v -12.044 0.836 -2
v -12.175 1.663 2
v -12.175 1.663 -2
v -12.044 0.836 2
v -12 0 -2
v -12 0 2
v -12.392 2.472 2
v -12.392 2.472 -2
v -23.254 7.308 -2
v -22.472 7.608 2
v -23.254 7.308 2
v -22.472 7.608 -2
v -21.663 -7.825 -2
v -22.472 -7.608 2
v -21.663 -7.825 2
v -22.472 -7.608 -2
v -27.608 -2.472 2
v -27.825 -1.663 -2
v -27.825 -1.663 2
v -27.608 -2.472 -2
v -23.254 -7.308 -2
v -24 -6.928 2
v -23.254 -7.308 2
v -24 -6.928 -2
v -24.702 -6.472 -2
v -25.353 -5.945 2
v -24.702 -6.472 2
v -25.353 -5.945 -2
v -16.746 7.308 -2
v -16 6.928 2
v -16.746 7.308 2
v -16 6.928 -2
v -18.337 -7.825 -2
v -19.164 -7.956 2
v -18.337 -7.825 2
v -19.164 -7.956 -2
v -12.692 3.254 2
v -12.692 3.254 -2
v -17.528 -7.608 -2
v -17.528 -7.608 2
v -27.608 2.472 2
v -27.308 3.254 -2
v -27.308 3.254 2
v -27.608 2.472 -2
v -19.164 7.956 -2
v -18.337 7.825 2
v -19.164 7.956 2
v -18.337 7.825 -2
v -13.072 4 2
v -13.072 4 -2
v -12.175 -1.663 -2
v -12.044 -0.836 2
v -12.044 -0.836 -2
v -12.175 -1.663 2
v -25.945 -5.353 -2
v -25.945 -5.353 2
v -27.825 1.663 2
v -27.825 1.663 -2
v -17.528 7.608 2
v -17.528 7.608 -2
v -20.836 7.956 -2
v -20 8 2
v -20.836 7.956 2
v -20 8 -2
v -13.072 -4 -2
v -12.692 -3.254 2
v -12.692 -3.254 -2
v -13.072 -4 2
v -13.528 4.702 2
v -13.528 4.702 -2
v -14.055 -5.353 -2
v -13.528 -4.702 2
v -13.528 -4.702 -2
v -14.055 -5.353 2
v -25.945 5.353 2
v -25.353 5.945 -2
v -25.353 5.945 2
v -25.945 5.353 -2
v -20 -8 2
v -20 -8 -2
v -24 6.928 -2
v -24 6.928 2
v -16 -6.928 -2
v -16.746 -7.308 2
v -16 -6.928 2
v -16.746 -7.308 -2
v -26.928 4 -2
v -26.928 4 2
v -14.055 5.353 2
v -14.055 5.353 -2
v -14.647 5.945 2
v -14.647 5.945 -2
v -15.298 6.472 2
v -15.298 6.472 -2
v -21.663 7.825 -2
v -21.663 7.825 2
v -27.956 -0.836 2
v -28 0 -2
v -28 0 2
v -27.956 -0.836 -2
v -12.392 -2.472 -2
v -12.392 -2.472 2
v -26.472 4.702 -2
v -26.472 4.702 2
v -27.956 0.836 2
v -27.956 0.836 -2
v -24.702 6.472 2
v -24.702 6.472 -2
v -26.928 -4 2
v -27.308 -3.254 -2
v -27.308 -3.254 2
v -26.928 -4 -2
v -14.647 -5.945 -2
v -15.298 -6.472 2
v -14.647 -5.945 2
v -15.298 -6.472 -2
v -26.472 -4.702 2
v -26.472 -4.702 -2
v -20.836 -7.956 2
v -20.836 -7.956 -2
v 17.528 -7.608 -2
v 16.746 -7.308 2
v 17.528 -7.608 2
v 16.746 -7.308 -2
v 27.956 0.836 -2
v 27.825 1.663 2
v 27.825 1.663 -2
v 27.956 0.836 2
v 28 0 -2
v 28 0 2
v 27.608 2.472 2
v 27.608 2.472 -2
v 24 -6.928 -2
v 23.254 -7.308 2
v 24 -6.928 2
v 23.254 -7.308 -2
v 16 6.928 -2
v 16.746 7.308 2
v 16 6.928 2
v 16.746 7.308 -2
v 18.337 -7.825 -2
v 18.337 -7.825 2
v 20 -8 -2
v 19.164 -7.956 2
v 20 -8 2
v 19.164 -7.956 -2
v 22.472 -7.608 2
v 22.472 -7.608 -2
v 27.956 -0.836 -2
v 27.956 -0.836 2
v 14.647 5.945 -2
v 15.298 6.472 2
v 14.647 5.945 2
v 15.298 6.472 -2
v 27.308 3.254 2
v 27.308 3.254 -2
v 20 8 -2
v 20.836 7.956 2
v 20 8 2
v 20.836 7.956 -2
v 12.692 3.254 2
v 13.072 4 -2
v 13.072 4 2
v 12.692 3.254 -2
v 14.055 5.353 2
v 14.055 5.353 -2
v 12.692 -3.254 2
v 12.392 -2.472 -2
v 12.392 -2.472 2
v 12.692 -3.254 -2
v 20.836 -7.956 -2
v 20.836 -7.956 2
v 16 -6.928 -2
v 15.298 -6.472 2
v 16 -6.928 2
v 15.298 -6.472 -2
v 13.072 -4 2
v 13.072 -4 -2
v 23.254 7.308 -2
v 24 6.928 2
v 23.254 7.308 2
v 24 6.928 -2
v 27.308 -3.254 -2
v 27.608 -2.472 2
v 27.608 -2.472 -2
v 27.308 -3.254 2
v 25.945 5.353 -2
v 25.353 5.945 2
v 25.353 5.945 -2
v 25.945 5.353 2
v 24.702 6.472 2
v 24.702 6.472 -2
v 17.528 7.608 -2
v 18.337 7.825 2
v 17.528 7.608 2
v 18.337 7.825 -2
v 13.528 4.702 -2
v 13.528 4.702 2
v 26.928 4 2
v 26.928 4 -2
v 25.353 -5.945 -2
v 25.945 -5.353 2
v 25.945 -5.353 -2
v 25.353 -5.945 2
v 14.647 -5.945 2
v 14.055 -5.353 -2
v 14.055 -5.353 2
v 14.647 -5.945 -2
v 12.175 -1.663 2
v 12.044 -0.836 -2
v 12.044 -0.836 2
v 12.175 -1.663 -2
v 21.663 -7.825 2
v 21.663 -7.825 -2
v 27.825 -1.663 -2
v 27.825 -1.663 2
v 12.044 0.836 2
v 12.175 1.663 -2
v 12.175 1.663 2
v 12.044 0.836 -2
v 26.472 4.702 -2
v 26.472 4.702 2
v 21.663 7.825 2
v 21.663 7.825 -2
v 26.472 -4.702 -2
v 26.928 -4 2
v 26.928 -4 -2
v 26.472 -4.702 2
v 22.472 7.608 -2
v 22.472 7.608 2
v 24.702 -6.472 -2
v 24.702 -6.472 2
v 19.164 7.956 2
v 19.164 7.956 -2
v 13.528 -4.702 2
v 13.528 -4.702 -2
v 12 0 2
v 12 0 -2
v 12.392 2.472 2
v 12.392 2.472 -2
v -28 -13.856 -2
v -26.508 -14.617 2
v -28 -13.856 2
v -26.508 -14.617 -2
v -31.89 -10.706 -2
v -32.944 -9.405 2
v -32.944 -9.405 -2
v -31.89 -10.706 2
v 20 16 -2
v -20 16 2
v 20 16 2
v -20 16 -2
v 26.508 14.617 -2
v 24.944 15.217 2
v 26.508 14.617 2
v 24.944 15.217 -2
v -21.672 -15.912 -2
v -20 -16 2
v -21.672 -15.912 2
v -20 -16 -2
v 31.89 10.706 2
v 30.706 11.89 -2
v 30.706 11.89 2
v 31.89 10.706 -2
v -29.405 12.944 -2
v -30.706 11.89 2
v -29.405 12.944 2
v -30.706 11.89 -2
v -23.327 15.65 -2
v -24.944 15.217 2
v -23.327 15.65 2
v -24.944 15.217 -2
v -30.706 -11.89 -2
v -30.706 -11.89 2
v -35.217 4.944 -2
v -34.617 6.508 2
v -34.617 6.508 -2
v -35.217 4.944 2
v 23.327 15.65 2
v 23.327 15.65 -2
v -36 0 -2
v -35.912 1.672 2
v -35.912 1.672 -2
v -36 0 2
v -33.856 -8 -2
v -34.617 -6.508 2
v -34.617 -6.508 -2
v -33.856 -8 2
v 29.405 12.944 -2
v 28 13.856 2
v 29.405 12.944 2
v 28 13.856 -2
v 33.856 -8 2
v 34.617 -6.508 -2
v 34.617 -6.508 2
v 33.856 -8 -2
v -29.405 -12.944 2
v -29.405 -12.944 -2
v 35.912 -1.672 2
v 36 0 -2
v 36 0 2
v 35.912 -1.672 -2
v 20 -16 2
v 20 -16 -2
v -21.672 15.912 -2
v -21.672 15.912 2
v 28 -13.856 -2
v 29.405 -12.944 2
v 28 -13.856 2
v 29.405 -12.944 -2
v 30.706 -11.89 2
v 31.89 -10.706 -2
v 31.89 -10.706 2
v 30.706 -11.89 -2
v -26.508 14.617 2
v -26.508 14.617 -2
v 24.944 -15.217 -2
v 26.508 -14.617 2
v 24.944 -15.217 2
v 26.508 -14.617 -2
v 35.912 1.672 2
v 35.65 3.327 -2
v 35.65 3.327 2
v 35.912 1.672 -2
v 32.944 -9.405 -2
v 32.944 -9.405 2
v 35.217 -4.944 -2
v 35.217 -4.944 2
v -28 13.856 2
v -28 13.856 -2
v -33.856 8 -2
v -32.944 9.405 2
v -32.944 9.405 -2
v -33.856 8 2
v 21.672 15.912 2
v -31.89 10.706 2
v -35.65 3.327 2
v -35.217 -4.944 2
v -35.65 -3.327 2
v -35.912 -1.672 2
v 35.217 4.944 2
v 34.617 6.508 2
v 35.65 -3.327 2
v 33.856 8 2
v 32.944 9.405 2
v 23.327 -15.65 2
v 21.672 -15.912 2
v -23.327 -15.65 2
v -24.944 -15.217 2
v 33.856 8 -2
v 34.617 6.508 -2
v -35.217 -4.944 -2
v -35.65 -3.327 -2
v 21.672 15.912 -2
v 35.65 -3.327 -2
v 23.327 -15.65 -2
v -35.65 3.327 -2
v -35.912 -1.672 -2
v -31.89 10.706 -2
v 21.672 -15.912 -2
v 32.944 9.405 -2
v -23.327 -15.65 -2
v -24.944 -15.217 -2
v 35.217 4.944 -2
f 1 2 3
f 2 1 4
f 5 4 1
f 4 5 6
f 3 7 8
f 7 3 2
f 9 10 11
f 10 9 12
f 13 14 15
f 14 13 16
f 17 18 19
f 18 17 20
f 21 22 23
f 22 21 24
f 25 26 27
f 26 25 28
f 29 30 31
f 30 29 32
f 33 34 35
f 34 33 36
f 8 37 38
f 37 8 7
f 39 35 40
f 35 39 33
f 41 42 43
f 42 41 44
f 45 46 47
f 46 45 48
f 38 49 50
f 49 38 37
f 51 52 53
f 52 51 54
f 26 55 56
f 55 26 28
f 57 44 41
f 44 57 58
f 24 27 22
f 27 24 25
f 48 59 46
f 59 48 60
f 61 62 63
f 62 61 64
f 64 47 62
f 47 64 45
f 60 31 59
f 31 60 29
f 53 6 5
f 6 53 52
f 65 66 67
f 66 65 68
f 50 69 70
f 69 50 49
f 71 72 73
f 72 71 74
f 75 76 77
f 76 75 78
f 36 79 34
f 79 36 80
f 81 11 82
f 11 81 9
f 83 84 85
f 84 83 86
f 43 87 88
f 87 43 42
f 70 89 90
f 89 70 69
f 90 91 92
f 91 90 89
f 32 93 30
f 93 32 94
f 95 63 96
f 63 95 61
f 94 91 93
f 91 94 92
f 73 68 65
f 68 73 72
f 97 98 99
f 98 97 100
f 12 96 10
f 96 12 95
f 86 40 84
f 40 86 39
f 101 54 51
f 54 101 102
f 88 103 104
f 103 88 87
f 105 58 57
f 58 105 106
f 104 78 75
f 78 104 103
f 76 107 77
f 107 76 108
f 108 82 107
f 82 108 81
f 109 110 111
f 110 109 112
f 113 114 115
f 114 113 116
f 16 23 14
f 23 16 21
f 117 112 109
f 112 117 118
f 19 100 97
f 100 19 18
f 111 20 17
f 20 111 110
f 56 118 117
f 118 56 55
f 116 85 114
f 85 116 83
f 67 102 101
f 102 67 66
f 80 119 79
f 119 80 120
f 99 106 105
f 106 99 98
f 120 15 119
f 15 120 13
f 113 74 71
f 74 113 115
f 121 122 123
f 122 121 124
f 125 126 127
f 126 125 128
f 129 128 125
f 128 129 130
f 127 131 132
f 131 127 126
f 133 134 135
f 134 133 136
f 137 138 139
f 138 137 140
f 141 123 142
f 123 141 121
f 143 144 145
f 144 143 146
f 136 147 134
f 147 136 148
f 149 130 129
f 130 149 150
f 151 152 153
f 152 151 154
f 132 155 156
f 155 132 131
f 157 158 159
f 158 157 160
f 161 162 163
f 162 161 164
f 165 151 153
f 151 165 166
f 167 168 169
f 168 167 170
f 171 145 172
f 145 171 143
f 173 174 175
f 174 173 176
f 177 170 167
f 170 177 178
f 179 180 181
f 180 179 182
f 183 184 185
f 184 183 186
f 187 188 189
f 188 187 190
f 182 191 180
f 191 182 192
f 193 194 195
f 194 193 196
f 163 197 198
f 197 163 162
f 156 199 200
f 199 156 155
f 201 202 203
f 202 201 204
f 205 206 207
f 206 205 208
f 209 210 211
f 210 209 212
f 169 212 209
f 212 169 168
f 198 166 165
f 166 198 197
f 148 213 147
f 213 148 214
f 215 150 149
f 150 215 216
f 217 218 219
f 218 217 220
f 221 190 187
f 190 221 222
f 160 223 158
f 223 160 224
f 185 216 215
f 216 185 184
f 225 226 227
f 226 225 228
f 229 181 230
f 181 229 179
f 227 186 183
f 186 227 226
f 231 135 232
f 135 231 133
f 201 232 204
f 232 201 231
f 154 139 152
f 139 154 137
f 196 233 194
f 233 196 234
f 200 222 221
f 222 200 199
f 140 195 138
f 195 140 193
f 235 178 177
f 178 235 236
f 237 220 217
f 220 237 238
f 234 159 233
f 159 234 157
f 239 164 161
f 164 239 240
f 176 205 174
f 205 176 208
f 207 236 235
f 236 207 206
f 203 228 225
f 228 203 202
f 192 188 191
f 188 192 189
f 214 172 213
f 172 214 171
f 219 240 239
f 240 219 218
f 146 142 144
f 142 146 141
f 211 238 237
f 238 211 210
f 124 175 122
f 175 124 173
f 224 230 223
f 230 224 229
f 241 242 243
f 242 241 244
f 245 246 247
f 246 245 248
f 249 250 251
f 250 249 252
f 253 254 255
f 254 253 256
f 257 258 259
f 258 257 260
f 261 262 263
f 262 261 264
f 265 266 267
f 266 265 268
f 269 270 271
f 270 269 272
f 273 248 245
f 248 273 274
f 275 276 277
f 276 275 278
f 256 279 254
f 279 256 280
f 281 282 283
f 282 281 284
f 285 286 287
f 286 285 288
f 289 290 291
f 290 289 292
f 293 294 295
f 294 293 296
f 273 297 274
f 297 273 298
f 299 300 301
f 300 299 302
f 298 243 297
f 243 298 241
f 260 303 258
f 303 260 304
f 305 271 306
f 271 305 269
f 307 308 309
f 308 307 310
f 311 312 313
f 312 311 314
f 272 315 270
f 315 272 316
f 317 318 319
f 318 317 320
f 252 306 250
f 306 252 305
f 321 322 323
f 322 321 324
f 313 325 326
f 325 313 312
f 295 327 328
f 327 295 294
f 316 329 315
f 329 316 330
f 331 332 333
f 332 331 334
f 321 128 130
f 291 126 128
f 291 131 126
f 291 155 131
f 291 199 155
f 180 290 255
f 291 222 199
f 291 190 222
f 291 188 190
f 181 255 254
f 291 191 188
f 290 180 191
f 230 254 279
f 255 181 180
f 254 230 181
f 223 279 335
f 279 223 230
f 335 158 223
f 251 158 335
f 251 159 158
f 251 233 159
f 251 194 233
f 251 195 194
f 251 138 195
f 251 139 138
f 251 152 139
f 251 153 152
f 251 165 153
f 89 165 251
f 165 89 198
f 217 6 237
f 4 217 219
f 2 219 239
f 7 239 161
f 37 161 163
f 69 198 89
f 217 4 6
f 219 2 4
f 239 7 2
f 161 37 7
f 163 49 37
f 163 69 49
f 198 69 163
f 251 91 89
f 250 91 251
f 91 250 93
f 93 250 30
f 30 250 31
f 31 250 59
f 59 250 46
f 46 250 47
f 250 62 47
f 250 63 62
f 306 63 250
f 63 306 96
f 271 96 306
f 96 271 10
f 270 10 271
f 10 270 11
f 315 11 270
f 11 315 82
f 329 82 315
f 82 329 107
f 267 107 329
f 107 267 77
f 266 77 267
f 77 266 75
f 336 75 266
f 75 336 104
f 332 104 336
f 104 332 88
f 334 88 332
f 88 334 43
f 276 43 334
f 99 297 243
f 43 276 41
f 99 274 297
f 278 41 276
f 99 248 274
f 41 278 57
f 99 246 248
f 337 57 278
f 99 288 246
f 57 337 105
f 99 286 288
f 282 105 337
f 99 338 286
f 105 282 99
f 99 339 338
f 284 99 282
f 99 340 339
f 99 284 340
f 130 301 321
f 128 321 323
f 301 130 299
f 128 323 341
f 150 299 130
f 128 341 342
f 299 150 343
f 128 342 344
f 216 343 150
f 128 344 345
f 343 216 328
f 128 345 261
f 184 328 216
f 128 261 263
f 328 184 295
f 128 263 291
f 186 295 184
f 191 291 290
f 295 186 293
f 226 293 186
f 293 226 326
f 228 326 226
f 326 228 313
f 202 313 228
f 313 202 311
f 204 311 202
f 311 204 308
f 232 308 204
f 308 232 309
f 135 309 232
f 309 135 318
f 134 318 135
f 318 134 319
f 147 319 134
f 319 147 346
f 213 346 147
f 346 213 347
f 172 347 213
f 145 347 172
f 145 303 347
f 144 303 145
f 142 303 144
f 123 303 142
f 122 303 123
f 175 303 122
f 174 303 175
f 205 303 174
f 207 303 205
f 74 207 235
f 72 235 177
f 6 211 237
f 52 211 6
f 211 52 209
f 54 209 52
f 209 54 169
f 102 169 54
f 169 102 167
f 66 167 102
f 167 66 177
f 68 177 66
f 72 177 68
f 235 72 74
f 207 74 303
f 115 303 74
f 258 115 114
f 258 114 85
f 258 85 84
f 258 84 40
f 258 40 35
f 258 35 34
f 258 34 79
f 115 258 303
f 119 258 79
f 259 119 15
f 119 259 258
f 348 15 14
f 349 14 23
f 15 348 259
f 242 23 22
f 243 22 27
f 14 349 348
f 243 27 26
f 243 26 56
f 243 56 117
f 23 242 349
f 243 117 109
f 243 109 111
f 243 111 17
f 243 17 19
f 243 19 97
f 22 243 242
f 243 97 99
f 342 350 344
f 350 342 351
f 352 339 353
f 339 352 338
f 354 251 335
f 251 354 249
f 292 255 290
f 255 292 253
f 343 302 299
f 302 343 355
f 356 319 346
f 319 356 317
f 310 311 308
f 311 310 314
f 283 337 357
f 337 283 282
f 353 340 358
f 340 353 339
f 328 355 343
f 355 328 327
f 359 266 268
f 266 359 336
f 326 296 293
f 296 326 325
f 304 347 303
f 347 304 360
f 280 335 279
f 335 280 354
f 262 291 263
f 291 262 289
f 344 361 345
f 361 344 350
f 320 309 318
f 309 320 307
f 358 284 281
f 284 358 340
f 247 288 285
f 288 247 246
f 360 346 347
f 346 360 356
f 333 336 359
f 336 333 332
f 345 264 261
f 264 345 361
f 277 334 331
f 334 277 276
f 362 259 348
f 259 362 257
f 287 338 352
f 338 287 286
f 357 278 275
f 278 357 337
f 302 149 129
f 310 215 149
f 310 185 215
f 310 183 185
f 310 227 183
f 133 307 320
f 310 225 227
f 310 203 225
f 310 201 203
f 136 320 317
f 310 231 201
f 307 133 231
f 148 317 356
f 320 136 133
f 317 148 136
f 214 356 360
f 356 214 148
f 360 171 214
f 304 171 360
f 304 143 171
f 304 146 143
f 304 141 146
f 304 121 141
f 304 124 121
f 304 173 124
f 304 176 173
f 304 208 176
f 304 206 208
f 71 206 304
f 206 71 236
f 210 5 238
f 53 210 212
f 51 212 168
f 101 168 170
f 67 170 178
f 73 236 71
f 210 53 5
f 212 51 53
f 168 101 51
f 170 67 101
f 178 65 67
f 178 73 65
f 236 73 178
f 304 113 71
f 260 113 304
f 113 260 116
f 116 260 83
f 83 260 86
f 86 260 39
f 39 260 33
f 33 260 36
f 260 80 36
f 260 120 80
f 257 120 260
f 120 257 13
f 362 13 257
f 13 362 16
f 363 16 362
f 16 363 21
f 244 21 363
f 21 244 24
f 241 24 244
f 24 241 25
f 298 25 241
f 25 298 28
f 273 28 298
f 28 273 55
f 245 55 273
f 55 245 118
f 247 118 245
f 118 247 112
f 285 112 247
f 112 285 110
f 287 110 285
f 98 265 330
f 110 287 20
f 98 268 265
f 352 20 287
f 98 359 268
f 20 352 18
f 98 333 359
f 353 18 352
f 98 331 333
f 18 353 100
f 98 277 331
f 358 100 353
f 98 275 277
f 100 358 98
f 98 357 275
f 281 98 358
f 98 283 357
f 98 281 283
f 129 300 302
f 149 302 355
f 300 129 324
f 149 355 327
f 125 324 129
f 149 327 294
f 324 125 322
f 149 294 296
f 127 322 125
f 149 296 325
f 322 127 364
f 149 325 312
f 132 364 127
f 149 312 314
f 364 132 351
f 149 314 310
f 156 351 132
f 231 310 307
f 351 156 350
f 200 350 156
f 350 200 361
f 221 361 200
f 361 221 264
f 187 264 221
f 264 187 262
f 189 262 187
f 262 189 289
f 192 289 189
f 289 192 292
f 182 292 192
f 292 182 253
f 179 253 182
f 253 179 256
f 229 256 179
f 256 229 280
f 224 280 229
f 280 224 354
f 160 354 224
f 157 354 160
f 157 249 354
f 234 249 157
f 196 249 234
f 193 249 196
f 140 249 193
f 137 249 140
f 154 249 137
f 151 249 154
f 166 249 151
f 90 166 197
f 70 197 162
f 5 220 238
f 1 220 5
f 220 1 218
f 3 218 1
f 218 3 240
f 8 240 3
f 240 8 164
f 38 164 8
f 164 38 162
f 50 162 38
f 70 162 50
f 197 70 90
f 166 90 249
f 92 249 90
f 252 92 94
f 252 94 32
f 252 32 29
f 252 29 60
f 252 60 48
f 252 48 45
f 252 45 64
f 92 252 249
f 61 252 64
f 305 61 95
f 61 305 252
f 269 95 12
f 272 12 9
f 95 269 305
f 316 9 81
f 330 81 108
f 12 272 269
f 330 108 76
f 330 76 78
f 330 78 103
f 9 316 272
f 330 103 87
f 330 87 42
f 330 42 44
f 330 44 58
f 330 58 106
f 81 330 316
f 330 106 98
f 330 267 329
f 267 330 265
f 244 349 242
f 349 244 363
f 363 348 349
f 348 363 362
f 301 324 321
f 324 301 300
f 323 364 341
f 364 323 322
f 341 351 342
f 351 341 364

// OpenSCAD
// Two-hole link plate.
$fn = 60;
eps = 0.02;
hole_d = 16;
length = 72;
width = 32;
thickness = 4;
difference() { hull() { translate([-length/2+width/2,0,0]) cylinder(d=width,h=thickness,center=true); translate([length/2-width/2,0,0]) cylinder(d=width,h=thickness,center=true); } for(x=[-length/2+width/2,length/2-width/2]) translate([x,0,-thickness/2-eps]) cylinder(d=hole_d,h=thickness+2*eps); }
